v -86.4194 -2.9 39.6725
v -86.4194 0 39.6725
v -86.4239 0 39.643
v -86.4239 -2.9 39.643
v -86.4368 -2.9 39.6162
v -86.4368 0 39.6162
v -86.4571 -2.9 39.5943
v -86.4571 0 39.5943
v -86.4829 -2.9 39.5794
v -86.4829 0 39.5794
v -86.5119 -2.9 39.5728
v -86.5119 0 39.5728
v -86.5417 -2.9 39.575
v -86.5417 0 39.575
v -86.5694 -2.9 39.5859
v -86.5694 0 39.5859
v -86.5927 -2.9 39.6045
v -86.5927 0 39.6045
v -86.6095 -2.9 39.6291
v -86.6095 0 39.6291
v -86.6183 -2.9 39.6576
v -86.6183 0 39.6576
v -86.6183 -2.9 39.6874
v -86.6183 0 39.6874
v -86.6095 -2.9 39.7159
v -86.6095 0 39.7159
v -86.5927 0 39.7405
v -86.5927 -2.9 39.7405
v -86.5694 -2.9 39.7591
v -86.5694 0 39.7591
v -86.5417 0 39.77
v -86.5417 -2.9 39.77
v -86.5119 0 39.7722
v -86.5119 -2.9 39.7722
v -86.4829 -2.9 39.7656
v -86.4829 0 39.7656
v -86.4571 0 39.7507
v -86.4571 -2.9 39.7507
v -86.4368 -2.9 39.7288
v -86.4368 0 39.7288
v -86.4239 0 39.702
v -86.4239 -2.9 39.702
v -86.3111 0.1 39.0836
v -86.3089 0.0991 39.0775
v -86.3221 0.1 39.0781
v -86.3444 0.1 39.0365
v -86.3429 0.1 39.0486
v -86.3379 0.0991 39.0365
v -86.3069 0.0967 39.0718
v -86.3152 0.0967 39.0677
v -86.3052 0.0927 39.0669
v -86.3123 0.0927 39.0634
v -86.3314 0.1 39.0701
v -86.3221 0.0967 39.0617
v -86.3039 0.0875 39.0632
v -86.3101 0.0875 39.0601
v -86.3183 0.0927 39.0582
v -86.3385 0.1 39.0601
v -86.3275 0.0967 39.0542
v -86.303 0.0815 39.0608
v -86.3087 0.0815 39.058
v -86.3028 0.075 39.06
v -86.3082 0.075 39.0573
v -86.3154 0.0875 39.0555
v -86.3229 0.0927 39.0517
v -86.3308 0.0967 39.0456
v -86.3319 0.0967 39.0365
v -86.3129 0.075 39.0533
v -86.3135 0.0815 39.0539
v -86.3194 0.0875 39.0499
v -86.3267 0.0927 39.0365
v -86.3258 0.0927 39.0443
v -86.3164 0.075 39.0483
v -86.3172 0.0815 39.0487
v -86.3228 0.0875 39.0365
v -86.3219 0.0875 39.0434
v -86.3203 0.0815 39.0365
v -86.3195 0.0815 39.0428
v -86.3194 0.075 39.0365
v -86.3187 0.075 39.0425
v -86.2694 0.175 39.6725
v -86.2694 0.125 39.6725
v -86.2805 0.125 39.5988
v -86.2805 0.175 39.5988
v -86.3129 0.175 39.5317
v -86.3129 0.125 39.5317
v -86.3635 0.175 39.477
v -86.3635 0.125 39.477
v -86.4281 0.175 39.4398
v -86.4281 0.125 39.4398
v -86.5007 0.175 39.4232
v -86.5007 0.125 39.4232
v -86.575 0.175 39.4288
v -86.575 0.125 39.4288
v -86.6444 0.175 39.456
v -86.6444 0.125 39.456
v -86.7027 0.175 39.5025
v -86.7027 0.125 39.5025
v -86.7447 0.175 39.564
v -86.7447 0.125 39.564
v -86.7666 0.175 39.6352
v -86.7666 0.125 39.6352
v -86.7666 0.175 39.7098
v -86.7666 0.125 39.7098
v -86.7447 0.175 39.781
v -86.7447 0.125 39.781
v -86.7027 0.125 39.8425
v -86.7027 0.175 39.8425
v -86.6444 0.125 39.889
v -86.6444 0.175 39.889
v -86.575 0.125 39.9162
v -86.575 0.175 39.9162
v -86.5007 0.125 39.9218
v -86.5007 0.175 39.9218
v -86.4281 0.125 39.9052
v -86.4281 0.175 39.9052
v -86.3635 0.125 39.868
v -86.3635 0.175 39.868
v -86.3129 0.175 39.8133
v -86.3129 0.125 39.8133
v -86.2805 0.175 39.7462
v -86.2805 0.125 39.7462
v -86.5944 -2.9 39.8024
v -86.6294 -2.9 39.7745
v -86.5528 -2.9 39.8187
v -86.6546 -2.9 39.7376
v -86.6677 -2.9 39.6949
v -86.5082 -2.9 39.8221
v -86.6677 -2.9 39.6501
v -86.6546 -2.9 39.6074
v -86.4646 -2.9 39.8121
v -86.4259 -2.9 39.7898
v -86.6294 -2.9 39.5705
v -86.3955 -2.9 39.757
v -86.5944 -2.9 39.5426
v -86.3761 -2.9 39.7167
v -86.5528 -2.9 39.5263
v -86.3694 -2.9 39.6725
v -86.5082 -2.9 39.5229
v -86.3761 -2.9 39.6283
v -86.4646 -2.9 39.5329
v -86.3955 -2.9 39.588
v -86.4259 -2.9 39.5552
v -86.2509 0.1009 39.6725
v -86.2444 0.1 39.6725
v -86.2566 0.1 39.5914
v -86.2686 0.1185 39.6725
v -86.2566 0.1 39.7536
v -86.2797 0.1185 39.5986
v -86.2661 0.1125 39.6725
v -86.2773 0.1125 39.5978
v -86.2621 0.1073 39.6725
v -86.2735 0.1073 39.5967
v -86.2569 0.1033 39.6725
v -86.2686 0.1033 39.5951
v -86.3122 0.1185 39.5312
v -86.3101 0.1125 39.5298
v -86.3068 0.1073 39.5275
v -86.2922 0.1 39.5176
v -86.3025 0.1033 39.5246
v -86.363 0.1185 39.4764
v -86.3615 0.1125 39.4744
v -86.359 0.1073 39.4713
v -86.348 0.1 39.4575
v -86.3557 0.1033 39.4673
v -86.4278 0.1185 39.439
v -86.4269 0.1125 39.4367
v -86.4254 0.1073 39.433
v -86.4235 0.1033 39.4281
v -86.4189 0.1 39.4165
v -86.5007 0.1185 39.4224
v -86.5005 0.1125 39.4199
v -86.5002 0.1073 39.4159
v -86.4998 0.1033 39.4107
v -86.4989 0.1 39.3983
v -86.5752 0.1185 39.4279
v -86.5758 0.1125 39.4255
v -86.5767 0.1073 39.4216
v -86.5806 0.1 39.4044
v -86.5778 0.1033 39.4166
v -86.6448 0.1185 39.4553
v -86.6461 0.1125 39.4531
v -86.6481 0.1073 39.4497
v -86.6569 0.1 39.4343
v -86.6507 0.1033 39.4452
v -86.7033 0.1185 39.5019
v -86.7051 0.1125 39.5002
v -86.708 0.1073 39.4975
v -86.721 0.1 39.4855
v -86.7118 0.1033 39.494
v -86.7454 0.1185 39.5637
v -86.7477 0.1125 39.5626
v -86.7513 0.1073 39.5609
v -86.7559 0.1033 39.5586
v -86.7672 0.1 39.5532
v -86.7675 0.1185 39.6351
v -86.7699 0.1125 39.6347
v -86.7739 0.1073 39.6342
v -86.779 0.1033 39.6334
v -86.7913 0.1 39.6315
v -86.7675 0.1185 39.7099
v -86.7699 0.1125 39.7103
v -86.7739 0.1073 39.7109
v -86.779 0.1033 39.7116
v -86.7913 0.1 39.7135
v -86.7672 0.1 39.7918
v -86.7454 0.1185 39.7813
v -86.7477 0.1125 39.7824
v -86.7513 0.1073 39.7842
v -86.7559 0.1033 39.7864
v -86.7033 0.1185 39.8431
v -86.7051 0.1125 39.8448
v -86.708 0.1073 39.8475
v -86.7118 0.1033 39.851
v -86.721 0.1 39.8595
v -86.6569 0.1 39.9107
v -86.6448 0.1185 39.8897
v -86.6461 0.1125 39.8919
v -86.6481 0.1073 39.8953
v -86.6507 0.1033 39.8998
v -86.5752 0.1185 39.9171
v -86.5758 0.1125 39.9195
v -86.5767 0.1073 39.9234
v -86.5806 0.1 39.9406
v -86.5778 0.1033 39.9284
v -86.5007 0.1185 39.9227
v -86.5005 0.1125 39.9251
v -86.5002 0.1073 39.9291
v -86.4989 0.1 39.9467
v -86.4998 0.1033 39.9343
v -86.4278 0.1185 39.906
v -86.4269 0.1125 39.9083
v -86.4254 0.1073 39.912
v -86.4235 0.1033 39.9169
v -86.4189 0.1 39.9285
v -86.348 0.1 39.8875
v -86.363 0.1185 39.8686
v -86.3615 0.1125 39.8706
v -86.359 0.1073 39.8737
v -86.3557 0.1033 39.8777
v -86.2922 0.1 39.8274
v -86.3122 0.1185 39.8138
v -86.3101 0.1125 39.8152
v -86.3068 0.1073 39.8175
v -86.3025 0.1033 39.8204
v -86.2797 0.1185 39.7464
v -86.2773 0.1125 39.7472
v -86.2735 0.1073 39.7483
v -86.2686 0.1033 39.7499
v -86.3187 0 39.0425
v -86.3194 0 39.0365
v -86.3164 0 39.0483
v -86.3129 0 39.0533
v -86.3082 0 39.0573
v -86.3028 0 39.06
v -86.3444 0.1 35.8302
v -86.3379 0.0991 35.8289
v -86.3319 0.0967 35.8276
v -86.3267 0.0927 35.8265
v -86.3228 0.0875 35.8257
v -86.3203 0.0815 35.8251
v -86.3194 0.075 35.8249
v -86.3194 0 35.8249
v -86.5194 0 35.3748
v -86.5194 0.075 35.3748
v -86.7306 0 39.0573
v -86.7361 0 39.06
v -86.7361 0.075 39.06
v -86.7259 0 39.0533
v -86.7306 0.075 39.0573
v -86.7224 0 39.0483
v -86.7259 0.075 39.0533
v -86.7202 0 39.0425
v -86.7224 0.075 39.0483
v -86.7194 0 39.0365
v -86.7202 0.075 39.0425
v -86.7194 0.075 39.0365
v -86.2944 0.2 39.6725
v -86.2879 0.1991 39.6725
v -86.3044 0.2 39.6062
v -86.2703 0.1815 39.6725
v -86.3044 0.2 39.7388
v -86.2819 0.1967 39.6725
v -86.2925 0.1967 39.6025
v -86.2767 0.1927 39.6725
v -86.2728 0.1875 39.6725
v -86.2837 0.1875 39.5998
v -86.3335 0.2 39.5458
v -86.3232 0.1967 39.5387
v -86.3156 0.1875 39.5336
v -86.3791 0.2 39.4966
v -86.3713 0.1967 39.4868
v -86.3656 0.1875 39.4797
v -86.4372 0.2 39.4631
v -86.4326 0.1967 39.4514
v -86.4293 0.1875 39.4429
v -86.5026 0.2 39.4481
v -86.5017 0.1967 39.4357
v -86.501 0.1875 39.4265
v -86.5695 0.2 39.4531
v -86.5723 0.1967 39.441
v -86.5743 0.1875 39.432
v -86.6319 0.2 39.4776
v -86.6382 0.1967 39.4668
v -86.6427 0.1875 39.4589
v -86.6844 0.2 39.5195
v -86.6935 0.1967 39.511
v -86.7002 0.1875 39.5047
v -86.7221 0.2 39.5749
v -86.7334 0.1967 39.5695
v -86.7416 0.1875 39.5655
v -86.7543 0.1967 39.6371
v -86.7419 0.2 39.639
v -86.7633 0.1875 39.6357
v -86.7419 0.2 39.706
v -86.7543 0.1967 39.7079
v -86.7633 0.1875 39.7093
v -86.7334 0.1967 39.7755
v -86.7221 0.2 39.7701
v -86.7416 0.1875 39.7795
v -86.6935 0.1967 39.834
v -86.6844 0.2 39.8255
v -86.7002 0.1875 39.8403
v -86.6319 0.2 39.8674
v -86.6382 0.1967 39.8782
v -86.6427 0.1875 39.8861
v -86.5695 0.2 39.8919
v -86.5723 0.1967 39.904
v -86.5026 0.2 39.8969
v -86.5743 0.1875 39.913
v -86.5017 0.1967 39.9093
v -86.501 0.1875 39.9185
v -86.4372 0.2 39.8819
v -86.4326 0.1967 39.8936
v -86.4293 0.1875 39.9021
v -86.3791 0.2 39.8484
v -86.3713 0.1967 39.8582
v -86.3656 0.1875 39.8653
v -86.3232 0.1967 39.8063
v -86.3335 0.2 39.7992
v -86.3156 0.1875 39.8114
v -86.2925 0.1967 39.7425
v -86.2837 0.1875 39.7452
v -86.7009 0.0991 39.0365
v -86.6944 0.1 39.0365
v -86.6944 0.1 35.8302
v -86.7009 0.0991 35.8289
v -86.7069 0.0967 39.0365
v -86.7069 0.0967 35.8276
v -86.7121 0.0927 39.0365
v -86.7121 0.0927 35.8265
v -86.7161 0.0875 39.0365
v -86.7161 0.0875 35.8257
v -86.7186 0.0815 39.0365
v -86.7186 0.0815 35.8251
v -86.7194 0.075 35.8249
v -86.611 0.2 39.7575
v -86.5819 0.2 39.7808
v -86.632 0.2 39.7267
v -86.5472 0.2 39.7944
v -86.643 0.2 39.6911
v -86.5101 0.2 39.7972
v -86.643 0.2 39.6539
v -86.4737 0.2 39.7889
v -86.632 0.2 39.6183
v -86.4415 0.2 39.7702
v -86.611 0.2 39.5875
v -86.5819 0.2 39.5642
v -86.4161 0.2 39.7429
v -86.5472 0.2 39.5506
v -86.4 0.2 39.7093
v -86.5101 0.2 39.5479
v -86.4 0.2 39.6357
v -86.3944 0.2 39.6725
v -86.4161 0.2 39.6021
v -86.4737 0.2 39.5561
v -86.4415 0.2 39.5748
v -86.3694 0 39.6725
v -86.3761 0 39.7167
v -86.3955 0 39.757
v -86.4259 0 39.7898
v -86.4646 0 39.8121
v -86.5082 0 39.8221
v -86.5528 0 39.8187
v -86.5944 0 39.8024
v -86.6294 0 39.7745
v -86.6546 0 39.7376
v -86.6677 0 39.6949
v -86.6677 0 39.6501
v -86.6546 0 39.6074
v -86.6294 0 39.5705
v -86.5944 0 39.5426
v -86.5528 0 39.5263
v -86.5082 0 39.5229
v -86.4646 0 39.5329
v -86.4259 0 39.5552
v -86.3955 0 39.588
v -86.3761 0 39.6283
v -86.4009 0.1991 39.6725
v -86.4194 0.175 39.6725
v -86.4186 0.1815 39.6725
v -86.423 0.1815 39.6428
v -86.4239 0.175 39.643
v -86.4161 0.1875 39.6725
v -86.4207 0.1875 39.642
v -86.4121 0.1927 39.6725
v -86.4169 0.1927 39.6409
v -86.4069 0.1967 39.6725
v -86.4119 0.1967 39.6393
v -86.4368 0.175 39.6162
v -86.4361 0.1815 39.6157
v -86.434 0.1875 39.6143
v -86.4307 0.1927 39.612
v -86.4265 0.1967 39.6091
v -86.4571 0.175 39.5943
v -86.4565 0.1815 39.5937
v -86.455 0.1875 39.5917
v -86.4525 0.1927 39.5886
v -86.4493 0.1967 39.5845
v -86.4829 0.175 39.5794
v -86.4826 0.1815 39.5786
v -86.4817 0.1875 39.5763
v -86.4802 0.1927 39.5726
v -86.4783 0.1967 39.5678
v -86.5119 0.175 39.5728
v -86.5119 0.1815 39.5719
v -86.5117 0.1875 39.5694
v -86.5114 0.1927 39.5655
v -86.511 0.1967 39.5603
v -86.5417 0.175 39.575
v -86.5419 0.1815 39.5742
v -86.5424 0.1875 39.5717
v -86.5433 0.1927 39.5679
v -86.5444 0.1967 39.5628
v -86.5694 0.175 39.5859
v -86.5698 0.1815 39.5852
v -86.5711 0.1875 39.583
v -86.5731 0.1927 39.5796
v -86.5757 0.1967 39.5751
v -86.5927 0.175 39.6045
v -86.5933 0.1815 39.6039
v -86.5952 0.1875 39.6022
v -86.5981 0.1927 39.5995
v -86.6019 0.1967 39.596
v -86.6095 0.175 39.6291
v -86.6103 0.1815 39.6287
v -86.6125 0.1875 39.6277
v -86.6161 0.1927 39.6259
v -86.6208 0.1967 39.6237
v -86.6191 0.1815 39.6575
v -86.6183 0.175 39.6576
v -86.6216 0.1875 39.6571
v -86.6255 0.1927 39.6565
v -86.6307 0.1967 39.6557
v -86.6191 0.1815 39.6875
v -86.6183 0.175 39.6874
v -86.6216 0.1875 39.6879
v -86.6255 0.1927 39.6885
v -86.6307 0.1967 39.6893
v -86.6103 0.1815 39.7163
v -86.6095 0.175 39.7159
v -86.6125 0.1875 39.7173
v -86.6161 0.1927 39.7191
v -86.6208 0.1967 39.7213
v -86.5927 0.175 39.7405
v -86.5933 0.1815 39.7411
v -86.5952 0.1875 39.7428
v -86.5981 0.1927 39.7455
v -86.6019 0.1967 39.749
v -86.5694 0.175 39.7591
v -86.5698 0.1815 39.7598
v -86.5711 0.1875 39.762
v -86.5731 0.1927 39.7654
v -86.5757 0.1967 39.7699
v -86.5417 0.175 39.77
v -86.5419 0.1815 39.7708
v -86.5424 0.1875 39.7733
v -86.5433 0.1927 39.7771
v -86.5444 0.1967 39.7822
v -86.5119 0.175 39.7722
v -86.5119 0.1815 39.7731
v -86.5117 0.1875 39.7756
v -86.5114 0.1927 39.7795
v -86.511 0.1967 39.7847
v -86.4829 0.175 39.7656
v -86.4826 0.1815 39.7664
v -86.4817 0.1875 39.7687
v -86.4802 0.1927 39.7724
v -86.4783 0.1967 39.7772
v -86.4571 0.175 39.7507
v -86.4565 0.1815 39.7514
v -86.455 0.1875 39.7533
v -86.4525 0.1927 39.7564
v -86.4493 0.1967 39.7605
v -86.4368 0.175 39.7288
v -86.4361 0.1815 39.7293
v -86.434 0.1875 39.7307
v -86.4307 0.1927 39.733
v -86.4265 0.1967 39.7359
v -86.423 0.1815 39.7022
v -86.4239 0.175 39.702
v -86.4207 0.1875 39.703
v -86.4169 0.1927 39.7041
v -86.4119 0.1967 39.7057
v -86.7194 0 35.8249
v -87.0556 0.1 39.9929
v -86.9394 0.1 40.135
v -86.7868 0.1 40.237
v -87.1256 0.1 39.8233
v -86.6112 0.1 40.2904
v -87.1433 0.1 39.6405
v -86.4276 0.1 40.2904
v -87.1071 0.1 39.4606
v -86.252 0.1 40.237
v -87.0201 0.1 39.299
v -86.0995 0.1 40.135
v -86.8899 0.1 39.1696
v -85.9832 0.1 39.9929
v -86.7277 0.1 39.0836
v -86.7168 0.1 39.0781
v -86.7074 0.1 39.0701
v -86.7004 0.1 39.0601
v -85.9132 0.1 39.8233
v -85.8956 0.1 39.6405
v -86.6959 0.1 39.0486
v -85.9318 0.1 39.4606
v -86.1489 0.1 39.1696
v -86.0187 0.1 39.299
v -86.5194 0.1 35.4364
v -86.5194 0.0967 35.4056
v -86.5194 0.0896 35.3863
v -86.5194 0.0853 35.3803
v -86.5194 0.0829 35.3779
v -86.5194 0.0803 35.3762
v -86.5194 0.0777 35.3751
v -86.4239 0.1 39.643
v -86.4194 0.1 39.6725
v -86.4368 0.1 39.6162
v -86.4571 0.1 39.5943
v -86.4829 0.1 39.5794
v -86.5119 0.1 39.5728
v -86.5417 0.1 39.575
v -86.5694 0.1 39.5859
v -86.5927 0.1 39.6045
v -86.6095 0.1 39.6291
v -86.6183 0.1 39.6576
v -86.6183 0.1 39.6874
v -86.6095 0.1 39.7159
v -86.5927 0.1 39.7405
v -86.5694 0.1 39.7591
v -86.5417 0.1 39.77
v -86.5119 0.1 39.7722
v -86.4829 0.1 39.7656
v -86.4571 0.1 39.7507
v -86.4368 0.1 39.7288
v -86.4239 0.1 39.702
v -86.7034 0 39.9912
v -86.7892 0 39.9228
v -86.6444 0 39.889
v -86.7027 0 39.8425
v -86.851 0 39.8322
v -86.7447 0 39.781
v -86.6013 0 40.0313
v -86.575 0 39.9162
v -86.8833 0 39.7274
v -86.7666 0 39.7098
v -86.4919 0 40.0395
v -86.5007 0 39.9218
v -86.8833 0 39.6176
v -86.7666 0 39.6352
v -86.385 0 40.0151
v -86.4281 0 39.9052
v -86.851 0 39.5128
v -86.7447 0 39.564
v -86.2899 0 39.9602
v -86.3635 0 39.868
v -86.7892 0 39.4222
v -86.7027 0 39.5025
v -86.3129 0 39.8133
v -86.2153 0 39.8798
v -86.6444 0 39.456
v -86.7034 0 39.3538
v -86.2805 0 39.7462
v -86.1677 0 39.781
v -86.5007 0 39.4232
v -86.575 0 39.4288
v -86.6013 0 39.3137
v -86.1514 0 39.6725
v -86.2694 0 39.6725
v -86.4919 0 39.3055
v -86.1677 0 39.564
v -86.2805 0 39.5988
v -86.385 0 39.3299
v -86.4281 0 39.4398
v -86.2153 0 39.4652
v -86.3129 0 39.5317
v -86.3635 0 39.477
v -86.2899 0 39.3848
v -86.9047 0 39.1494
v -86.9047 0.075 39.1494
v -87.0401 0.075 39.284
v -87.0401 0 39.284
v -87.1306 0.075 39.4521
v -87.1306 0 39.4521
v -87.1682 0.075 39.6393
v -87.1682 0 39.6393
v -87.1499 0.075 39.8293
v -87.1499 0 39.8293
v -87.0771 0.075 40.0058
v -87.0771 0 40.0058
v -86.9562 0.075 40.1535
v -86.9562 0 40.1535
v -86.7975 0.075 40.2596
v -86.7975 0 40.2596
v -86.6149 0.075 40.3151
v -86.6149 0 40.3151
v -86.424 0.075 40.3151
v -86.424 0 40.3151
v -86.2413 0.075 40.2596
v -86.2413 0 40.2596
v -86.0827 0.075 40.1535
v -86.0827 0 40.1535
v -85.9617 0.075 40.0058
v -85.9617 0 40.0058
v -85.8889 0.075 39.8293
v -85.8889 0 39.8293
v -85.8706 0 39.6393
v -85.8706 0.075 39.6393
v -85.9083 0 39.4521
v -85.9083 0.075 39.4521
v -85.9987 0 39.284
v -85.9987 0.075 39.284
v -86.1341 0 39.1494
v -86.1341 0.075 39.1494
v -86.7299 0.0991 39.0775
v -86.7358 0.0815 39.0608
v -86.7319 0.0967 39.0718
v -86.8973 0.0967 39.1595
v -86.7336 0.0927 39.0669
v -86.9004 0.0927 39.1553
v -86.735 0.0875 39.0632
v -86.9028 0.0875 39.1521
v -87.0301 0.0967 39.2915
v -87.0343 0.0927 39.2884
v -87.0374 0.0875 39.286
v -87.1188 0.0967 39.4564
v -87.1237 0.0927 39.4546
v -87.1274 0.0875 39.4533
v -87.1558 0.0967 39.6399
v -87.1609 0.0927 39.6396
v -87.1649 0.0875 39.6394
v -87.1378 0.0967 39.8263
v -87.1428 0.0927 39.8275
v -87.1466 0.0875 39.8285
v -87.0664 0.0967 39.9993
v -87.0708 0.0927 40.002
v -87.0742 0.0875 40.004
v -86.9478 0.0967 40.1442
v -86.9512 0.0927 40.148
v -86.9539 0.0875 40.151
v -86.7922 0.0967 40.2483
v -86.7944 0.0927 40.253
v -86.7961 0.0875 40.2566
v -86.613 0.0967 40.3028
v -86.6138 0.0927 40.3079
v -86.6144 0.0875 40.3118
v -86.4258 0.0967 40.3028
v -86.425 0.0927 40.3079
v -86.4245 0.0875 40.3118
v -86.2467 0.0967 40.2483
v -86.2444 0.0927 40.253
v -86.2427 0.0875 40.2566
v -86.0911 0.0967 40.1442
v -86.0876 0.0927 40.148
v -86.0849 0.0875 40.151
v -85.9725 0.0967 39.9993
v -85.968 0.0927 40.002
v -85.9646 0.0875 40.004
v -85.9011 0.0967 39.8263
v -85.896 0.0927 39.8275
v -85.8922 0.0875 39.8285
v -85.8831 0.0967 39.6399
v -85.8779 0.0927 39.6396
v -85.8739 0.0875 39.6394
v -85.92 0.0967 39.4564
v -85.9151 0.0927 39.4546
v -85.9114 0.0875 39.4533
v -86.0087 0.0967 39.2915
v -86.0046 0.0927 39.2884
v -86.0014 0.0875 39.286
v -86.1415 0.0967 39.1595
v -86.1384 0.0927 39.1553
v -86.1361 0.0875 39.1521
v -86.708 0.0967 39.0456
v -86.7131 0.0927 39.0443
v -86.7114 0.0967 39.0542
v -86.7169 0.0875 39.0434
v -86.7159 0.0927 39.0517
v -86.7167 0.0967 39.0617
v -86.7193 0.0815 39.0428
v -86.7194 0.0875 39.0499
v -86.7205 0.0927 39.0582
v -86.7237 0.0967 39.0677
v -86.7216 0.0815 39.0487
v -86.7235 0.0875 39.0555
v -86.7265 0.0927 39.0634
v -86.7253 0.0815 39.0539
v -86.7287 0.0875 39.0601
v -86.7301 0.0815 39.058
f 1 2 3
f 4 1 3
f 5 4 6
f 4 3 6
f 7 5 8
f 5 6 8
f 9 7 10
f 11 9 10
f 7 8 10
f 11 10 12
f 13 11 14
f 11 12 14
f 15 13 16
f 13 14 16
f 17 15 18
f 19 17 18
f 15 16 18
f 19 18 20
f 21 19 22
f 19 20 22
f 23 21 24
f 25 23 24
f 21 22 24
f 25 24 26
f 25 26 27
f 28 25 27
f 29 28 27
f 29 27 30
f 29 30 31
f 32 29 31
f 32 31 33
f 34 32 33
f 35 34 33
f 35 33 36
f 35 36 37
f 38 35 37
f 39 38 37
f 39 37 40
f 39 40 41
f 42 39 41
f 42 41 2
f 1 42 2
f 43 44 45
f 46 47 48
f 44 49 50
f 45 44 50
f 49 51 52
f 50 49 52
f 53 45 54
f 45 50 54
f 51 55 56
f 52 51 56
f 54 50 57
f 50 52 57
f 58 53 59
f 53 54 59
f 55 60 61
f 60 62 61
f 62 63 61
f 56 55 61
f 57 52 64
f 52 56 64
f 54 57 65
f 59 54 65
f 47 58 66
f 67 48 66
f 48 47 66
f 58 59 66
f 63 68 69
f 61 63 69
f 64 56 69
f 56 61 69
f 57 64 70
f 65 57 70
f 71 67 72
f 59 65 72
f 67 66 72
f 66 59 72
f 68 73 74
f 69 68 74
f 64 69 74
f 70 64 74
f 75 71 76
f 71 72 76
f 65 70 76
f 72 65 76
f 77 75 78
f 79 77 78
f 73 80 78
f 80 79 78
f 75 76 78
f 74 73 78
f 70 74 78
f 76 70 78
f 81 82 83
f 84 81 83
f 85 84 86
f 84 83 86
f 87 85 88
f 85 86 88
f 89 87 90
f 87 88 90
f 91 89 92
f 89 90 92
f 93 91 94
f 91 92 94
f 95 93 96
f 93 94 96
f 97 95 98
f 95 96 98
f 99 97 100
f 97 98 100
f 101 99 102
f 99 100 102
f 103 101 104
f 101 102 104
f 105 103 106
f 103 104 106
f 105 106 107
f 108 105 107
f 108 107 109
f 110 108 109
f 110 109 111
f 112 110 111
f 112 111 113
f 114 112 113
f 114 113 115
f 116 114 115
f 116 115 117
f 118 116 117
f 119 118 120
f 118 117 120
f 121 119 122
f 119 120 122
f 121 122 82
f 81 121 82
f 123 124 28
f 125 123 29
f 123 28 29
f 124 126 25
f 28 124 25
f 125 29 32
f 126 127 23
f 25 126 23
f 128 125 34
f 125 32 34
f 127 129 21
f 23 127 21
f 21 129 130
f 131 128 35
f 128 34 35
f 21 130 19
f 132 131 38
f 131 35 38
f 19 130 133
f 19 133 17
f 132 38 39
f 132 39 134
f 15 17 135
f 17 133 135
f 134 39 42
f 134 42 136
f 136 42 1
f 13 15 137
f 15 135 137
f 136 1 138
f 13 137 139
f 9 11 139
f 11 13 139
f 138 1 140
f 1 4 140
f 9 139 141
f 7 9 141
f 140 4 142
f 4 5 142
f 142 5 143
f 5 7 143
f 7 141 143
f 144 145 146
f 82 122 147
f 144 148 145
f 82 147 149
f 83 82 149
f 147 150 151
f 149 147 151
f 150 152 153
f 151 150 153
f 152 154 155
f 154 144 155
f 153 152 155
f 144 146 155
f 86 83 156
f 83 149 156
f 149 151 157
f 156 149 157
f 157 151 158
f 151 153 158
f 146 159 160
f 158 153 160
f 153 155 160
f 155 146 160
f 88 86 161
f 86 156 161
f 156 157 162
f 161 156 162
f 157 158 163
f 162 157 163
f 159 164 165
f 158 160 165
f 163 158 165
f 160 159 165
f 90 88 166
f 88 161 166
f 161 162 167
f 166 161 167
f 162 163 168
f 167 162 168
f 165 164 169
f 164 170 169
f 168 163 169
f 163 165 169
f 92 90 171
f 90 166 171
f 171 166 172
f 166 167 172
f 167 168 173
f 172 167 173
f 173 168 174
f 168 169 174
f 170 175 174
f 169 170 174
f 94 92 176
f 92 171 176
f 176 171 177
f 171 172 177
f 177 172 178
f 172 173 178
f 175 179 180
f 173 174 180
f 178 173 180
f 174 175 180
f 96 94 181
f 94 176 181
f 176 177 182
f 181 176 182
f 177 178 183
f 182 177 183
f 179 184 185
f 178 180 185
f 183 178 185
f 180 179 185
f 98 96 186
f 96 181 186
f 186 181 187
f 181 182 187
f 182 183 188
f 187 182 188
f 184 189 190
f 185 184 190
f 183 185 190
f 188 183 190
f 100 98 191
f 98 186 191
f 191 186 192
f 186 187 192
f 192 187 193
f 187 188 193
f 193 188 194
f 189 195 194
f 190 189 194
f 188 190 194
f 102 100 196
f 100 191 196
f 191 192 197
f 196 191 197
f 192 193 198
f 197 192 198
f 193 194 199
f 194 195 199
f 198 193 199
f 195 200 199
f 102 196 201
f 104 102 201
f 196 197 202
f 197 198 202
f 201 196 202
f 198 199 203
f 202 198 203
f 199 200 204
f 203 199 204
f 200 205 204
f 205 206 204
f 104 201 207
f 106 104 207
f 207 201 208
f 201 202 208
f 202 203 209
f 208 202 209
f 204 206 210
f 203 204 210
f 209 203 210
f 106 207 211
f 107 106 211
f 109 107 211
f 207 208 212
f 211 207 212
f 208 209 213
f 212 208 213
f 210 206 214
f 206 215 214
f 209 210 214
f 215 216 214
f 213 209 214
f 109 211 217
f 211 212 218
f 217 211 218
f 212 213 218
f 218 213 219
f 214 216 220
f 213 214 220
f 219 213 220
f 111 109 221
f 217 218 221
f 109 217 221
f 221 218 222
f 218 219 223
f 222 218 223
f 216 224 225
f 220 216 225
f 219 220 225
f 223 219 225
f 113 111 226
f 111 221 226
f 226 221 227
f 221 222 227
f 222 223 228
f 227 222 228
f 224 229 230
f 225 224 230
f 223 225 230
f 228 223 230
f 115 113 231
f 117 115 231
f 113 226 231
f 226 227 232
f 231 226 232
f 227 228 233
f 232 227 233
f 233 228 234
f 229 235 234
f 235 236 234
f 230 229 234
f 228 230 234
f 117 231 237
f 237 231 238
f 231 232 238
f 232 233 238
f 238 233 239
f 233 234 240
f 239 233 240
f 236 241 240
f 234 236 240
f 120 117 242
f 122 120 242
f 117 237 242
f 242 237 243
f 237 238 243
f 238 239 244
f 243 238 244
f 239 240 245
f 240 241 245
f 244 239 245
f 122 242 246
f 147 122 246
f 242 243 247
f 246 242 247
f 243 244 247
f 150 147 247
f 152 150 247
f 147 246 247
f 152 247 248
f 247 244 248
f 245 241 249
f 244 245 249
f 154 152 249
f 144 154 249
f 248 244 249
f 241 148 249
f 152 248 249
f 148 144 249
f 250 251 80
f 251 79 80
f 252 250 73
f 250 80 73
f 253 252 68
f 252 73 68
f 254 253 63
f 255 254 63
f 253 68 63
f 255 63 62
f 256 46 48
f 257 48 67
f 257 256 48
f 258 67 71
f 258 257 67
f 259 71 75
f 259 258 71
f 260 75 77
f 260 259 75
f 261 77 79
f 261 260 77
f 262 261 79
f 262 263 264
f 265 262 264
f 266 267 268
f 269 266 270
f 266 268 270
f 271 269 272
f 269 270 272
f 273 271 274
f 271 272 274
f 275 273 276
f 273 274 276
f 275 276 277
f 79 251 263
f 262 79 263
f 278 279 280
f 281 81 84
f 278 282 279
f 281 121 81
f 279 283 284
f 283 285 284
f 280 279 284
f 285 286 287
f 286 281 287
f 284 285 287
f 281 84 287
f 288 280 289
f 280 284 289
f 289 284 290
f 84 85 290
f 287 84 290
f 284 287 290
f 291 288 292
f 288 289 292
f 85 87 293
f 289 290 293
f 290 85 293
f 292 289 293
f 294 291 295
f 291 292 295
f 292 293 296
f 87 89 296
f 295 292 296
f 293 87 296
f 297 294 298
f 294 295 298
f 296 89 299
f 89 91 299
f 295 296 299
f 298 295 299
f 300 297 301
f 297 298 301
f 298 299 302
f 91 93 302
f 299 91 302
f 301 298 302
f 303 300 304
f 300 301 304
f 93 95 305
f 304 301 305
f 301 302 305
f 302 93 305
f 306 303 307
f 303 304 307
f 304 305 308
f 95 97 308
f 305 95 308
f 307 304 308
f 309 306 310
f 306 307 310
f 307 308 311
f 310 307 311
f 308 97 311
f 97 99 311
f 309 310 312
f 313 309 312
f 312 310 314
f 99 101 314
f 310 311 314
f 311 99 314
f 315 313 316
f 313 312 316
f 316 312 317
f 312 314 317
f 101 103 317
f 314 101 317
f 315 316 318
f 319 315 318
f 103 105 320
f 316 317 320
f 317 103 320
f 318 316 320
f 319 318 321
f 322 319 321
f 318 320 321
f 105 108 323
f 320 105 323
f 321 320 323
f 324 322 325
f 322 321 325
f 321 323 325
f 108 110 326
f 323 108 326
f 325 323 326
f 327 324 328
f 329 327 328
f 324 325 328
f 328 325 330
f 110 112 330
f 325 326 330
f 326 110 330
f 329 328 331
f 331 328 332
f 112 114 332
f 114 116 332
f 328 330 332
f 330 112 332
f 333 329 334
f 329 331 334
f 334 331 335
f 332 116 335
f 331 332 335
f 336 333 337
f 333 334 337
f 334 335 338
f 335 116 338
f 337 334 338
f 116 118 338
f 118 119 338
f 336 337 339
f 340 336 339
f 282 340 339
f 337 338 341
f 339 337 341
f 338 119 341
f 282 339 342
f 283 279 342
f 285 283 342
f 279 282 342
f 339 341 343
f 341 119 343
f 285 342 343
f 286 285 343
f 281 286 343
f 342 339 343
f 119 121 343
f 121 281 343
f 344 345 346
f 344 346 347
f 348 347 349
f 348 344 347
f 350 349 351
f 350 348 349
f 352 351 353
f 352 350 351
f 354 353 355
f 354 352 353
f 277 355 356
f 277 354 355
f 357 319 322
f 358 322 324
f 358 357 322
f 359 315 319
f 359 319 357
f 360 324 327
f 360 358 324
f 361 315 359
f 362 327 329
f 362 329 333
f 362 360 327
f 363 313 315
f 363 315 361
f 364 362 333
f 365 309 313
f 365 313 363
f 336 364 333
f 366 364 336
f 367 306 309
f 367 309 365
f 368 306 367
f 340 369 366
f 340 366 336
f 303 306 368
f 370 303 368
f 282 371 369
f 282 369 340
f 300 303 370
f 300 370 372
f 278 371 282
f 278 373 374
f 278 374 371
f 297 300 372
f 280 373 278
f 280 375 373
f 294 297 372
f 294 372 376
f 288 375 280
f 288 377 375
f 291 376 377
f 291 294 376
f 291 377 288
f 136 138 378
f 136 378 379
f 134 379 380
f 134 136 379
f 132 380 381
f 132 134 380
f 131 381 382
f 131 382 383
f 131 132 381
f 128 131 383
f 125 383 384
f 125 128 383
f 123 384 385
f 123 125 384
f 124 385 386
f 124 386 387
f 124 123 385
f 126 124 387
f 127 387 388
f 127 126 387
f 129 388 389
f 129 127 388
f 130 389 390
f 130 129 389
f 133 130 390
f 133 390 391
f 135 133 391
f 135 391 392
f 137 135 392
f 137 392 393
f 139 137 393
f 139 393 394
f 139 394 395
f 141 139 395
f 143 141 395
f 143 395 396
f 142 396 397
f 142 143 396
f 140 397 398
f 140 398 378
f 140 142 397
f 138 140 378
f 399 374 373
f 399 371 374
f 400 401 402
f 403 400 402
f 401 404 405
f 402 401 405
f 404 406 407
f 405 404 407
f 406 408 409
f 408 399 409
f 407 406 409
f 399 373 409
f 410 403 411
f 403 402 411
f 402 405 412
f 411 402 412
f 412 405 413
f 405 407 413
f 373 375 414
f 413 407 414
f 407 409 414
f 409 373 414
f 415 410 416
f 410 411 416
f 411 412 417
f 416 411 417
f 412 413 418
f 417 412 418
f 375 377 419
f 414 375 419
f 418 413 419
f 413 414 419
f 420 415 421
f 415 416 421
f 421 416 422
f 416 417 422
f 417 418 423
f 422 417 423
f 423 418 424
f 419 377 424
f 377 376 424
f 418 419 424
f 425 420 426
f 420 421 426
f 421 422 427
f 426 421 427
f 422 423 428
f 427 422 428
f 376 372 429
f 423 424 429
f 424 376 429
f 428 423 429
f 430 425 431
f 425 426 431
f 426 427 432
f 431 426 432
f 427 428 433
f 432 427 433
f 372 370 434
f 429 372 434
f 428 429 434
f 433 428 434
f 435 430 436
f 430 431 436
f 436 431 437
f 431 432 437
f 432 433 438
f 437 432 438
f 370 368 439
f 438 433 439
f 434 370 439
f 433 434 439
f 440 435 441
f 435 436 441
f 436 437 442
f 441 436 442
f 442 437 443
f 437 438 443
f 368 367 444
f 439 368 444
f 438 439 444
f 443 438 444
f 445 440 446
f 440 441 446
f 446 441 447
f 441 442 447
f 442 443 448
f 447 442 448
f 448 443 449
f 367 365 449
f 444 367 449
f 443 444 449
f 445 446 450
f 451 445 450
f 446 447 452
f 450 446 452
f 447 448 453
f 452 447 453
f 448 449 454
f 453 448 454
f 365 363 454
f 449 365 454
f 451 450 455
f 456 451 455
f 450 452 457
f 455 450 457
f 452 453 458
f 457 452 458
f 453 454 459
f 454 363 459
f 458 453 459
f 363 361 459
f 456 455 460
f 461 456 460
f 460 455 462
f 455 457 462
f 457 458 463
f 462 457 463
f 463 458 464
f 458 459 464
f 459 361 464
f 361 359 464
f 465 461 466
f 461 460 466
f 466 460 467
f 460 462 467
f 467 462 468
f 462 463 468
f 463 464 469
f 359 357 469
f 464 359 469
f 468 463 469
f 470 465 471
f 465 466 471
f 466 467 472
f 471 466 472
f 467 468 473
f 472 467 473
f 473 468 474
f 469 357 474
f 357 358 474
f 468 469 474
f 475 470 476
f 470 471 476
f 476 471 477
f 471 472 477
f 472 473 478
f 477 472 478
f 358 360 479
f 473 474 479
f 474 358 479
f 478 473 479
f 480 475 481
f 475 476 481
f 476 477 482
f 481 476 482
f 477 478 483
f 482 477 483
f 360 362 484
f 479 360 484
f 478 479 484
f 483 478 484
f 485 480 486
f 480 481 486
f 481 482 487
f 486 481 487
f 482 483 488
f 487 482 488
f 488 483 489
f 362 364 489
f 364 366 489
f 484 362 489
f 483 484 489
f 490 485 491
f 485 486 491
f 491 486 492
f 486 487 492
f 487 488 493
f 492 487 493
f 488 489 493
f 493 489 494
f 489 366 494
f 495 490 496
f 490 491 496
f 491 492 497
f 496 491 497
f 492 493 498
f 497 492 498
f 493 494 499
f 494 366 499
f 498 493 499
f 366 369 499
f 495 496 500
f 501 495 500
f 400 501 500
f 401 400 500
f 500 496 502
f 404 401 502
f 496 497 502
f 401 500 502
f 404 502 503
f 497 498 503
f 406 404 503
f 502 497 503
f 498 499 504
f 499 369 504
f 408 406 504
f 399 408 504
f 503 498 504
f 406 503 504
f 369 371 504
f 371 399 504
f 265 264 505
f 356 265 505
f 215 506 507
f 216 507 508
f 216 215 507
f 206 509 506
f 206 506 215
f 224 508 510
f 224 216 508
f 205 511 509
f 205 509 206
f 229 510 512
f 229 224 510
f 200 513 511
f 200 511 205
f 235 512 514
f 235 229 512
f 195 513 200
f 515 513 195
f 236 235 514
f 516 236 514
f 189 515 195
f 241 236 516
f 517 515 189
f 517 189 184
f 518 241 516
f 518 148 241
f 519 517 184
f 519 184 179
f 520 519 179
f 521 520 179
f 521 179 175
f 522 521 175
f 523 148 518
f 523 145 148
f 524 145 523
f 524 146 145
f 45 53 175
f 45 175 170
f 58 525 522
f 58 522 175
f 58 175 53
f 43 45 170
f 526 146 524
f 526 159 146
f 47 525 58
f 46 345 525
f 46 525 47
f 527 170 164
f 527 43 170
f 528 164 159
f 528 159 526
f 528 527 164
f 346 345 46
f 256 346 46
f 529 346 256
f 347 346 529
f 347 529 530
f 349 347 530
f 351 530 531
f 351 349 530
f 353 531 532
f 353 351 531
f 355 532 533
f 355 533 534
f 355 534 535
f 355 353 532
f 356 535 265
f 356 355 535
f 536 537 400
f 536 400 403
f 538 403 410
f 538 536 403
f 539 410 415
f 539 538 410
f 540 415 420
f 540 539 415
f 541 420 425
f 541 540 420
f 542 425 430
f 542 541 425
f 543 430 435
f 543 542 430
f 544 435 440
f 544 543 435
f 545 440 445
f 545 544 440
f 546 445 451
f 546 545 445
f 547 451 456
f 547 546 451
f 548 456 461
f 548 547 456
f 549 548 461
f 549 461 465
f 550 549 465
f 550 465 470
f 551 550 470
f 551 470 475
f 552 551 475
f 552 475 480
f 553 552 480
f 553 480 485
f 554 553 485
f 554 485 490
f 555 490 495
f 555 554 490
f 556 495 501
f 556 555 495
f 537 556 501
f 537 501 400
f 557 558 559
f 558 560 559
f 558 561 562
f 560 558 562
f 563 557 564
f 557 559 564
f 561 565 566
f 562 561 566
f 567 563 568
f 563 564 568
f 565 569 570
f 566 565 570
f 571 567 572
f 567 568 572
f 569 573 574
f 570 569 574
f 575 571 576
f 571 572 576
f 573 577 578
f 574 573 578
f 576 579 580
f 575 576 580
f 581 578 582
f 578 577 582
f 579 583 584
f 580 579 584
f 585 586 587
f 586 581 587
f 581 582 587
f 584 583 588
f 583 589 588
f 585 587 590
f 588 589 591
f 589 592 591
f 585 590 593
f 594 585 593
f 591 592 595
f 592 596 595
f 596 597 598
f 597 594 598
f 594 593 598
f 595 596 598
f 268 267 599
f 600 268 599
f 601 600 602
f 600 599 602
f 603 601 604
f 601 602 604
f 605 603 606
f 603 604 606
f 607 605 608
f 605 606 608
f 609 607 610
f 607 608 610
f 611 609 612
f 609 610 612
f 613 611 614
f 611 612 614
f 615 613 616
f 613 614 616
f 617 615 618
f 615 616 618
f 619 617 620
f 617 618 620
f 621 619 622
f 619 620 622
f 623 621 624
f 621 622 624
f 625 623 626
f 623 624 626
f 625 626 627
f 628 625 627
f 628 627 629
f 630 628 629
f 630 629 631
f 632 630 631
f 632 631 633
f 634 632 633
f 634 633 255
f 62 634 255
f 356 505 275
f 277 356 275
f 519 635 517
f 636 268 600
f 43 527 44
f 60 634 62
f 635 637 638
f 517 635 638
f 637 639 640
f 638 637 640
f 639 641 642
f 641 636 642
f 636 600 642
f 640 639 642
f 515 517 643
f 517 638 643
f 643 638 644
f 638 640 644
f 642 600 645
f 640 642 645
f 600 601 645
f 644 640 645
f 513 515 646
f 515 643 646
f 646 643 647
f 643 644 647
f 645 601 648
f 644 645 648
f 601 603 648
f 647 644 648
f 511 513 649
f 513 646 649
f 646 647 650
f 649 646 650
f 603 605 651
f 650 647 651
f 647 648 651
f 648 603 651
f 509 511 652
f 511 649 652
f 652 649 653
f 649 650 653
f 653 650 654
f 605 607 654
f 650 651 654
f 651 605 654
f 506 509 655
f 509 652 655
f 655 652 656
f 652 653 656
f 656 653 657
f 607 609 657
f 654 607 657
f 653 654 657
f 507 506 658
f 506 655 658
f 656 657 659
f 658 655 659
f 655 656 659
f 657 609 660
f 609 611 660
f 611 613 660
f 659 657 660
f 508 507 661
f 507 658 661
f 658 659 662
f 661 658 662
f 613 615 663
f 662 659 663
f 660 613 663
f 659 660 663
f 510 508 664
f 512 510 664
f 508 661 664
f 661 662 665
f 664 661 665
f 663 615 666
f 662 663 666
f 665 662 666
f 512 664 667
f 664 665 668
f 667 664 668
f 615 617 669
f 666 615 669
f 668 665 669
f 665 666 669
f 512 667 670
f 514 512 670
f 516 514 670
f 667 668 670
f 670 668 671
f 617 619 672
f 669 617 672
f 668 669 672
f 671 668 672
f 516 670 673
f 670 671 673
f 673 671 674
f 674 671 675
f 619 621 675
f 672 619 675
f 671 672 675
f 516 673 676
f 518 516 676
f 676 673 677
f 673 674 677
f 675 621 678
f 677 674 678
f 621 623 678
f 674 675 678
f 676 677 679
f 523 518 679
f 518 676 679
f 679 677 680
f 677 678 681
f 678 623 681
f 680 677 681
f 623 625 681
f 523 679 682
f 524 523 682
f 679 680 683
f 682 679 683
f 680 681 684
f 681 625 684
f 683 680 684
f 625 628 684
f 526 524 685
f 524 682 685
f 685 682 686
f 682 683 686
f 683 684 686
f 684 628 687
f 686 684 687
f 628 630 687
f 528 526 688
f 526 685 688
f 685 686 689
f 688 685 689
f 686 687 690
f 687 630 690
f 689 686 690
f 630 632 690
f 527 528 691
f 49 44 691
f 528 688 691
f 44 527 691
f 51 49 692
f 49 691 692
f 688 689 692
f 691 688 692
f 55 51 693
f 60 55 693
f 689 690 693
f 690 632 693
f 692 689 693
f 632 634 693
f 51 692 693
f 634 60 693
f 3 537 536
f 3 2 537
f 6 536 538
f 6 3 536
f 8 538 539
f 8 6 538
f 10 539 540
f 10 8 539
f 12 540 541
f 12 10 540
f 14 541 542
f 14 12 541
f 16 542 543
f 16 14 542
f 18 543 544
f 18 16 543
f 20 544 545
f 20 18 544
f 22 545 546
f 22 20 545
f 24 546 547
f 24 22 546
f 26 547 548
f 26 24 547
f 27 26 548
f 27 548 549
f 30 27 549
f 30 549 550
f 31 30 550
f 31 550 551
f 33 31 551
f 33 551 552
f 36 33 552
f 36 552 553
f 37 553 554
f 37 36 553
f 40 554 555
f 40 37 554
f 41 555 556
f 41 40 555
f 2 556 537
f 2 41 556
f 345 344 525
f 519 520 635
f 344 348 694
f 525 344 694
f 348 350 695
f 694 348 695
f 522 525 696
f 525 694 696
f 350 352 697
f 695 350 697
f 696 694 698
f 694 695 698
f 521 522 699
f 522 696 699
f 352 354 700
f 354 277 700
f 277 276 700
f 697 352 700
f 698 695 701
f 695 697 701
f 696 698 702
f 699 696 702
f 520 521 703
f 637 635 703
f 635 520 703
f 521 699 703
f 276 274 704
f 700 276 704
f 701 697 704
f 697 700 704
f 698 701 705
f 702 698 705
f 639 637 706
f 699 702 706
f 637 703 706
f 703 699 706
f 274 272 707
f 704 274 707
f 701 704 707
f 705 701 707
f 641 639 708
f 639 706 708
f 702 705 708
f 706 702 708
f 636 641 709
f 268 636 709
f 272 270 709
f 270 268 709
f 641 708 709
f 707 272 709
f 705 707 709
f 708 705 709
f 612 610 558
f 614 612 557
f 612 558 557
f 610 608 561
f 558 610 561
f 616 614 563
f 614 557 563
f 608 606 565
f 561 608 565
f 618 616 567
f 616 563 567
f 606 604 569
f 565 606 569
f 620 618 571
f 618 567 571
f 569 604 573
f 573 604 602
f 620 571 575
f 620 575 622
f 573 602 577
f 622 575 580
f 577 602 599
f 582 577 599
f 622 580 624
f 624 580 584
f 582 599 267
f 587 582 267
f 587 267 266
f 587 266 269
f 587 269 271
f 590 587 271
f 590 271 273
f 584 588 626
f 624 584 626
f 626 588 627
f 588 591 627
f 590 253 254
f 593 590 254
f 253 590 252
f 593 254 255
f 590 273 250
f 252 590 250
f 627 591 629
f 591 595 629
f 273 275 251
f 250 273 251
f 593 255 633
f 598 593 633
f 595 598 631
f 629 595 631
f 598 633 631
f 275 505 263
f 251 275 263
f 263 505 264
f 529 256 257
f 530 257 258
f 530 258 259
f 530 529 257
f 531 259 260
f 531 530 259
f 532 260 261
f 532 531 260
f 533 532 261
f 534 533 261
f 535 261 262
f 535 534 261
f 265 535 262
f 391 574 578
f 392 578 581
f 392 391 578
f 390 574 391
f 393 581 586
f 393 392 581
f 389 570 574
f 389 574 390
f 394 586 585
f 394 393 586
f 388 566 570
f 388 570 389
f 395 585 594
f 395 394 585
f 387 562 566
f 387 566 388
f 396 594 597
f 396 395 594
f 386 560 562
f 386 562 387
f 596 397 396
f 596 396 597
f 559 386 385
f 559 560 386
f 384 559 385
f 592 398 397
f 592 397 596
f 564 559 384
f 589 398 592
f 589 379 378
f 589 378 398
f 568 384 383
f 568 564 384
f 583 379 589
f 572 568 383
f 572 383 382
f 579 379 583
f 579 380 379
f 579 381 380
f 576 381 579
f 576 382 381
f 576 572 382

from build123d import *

# Parameters (mm, degrees)
SKETCH1_R                = 0.1
BOSS_EXTRUDE1_DEPTH      = 0.1
SKETCH2_R                = 0.25
SKETCH2_R_2              = 0.1
BOSS_EXTRUDE2_DEPTH      = 0.1
BOSS_EXTRUDE2_DEPTH_BACK = 3
FILLET1_R                = 0.025
FILLET2_R                = 0.025
SKETCH3_R                = 0.368033955
SKETCH3_R_2              = 0.15
CUT_EXTRUDE1_DEPTH       = 2.9


with BuildPart() as part:
    # Sketch1 → Boss-Extrude1 (new body)
    with BuildSketch(Plane(origin=(0, 0, 0), x_dir=(1, 0, 0), z_dir=(0, 1, 0))):
        with BuildLine():
            Line((-86.3194152, -39.054379804), (-86.3194152, -35.824941353))
            Line((-86.3194152, -35.824941353), (-86.5194152, -35.374777047))
            Line((-86.5194152, -35.374777047), (-86.7194152, -35.824941353))
            Line((-86.7194152, -35.824941353), (-86.7194152, -39.054379804))
            ThreePointArc((-86.7194152, -39.054379804), (-86.5194152, -40.322175119), (-86.3194152, -39.054379804))
        make_face()
        with Locations((-86.5194152, -39.672502044)):
            Circle(SKETCH1_R, mode=Mode.SUBTRACT)
    extrude(amount=BOSS_EXTRUDE1_DEPTH)

    # Sketch2 → Boss-Extrude2 (add, two sides)
    with BuildSketch(Plane(origin=(0, 0.1, 0), x_dir=(1, 0, 0), z_dir=(0, 1, 0))) as boss_extrude2_sk:
        with Locations((-86.5194152, -39.672502044)):
            Circle(SKETCH2_R)
        with Locations((-86.5194152, -39.672502044)):
            Circle(SKETCH2_R_2, mode=Mode.SUBTRACT)
    extrude(amount=BOSS_EXTRUDE2_DEPTH)
    extrude(boss_extrude2_sk.sketch, amount=-BOSS_EXTRUDE2_DEPTH_BACK)

    # Fillet1
    fillet1_edges = [part.edges().sort_by_distance(p)[0] for p in [
        (-86.6194152, 0.2, 39.672502044),
        (-86.7694152, 0.2, 39.672502044),
    ]]
    fillet(fillet1_edges, radius=FILLET1_R)

    # Fillet2
    fillet2_edges = [part.edges().sort_by_distance(p)[0] for p in [
        (-86.7194152, 0.1, 37.439660578),
        (-86.5194152, 0.1, 40.322175119),
        (-86.3194152, 0.1, 37.439660578),
        (-86.7694152, 0.1, 39.672502044),
        (-86.4194152, 0.1, 35.5998592),
        (-86.6194152, 0.1, 35.5998592),
        (-86.3194152, 0.05, 39.054379804),
        (-86.7194152, 0.05, 39.054379804),
    ]]
    fillet(fillet2_edges, radius=FILLET2_R)

    # Sketch3 → Cut-Extrude1 (cut)
    with BuildSketch(Plane.XZ.offset(2.9)):
        with Locations((-86.5194152, 39.672502044)):
            Circle(SKETCH3_R)
        with Locations((-86.5194152, 39.672502044)):
            Circle(SKETCH3_R_2, mode=Mode.SUBTRACT)
    extrude(amount=-CUT_EXTRUDE1_DEPTH, mode=Mode.SUBTRACT)


solid = part.part
